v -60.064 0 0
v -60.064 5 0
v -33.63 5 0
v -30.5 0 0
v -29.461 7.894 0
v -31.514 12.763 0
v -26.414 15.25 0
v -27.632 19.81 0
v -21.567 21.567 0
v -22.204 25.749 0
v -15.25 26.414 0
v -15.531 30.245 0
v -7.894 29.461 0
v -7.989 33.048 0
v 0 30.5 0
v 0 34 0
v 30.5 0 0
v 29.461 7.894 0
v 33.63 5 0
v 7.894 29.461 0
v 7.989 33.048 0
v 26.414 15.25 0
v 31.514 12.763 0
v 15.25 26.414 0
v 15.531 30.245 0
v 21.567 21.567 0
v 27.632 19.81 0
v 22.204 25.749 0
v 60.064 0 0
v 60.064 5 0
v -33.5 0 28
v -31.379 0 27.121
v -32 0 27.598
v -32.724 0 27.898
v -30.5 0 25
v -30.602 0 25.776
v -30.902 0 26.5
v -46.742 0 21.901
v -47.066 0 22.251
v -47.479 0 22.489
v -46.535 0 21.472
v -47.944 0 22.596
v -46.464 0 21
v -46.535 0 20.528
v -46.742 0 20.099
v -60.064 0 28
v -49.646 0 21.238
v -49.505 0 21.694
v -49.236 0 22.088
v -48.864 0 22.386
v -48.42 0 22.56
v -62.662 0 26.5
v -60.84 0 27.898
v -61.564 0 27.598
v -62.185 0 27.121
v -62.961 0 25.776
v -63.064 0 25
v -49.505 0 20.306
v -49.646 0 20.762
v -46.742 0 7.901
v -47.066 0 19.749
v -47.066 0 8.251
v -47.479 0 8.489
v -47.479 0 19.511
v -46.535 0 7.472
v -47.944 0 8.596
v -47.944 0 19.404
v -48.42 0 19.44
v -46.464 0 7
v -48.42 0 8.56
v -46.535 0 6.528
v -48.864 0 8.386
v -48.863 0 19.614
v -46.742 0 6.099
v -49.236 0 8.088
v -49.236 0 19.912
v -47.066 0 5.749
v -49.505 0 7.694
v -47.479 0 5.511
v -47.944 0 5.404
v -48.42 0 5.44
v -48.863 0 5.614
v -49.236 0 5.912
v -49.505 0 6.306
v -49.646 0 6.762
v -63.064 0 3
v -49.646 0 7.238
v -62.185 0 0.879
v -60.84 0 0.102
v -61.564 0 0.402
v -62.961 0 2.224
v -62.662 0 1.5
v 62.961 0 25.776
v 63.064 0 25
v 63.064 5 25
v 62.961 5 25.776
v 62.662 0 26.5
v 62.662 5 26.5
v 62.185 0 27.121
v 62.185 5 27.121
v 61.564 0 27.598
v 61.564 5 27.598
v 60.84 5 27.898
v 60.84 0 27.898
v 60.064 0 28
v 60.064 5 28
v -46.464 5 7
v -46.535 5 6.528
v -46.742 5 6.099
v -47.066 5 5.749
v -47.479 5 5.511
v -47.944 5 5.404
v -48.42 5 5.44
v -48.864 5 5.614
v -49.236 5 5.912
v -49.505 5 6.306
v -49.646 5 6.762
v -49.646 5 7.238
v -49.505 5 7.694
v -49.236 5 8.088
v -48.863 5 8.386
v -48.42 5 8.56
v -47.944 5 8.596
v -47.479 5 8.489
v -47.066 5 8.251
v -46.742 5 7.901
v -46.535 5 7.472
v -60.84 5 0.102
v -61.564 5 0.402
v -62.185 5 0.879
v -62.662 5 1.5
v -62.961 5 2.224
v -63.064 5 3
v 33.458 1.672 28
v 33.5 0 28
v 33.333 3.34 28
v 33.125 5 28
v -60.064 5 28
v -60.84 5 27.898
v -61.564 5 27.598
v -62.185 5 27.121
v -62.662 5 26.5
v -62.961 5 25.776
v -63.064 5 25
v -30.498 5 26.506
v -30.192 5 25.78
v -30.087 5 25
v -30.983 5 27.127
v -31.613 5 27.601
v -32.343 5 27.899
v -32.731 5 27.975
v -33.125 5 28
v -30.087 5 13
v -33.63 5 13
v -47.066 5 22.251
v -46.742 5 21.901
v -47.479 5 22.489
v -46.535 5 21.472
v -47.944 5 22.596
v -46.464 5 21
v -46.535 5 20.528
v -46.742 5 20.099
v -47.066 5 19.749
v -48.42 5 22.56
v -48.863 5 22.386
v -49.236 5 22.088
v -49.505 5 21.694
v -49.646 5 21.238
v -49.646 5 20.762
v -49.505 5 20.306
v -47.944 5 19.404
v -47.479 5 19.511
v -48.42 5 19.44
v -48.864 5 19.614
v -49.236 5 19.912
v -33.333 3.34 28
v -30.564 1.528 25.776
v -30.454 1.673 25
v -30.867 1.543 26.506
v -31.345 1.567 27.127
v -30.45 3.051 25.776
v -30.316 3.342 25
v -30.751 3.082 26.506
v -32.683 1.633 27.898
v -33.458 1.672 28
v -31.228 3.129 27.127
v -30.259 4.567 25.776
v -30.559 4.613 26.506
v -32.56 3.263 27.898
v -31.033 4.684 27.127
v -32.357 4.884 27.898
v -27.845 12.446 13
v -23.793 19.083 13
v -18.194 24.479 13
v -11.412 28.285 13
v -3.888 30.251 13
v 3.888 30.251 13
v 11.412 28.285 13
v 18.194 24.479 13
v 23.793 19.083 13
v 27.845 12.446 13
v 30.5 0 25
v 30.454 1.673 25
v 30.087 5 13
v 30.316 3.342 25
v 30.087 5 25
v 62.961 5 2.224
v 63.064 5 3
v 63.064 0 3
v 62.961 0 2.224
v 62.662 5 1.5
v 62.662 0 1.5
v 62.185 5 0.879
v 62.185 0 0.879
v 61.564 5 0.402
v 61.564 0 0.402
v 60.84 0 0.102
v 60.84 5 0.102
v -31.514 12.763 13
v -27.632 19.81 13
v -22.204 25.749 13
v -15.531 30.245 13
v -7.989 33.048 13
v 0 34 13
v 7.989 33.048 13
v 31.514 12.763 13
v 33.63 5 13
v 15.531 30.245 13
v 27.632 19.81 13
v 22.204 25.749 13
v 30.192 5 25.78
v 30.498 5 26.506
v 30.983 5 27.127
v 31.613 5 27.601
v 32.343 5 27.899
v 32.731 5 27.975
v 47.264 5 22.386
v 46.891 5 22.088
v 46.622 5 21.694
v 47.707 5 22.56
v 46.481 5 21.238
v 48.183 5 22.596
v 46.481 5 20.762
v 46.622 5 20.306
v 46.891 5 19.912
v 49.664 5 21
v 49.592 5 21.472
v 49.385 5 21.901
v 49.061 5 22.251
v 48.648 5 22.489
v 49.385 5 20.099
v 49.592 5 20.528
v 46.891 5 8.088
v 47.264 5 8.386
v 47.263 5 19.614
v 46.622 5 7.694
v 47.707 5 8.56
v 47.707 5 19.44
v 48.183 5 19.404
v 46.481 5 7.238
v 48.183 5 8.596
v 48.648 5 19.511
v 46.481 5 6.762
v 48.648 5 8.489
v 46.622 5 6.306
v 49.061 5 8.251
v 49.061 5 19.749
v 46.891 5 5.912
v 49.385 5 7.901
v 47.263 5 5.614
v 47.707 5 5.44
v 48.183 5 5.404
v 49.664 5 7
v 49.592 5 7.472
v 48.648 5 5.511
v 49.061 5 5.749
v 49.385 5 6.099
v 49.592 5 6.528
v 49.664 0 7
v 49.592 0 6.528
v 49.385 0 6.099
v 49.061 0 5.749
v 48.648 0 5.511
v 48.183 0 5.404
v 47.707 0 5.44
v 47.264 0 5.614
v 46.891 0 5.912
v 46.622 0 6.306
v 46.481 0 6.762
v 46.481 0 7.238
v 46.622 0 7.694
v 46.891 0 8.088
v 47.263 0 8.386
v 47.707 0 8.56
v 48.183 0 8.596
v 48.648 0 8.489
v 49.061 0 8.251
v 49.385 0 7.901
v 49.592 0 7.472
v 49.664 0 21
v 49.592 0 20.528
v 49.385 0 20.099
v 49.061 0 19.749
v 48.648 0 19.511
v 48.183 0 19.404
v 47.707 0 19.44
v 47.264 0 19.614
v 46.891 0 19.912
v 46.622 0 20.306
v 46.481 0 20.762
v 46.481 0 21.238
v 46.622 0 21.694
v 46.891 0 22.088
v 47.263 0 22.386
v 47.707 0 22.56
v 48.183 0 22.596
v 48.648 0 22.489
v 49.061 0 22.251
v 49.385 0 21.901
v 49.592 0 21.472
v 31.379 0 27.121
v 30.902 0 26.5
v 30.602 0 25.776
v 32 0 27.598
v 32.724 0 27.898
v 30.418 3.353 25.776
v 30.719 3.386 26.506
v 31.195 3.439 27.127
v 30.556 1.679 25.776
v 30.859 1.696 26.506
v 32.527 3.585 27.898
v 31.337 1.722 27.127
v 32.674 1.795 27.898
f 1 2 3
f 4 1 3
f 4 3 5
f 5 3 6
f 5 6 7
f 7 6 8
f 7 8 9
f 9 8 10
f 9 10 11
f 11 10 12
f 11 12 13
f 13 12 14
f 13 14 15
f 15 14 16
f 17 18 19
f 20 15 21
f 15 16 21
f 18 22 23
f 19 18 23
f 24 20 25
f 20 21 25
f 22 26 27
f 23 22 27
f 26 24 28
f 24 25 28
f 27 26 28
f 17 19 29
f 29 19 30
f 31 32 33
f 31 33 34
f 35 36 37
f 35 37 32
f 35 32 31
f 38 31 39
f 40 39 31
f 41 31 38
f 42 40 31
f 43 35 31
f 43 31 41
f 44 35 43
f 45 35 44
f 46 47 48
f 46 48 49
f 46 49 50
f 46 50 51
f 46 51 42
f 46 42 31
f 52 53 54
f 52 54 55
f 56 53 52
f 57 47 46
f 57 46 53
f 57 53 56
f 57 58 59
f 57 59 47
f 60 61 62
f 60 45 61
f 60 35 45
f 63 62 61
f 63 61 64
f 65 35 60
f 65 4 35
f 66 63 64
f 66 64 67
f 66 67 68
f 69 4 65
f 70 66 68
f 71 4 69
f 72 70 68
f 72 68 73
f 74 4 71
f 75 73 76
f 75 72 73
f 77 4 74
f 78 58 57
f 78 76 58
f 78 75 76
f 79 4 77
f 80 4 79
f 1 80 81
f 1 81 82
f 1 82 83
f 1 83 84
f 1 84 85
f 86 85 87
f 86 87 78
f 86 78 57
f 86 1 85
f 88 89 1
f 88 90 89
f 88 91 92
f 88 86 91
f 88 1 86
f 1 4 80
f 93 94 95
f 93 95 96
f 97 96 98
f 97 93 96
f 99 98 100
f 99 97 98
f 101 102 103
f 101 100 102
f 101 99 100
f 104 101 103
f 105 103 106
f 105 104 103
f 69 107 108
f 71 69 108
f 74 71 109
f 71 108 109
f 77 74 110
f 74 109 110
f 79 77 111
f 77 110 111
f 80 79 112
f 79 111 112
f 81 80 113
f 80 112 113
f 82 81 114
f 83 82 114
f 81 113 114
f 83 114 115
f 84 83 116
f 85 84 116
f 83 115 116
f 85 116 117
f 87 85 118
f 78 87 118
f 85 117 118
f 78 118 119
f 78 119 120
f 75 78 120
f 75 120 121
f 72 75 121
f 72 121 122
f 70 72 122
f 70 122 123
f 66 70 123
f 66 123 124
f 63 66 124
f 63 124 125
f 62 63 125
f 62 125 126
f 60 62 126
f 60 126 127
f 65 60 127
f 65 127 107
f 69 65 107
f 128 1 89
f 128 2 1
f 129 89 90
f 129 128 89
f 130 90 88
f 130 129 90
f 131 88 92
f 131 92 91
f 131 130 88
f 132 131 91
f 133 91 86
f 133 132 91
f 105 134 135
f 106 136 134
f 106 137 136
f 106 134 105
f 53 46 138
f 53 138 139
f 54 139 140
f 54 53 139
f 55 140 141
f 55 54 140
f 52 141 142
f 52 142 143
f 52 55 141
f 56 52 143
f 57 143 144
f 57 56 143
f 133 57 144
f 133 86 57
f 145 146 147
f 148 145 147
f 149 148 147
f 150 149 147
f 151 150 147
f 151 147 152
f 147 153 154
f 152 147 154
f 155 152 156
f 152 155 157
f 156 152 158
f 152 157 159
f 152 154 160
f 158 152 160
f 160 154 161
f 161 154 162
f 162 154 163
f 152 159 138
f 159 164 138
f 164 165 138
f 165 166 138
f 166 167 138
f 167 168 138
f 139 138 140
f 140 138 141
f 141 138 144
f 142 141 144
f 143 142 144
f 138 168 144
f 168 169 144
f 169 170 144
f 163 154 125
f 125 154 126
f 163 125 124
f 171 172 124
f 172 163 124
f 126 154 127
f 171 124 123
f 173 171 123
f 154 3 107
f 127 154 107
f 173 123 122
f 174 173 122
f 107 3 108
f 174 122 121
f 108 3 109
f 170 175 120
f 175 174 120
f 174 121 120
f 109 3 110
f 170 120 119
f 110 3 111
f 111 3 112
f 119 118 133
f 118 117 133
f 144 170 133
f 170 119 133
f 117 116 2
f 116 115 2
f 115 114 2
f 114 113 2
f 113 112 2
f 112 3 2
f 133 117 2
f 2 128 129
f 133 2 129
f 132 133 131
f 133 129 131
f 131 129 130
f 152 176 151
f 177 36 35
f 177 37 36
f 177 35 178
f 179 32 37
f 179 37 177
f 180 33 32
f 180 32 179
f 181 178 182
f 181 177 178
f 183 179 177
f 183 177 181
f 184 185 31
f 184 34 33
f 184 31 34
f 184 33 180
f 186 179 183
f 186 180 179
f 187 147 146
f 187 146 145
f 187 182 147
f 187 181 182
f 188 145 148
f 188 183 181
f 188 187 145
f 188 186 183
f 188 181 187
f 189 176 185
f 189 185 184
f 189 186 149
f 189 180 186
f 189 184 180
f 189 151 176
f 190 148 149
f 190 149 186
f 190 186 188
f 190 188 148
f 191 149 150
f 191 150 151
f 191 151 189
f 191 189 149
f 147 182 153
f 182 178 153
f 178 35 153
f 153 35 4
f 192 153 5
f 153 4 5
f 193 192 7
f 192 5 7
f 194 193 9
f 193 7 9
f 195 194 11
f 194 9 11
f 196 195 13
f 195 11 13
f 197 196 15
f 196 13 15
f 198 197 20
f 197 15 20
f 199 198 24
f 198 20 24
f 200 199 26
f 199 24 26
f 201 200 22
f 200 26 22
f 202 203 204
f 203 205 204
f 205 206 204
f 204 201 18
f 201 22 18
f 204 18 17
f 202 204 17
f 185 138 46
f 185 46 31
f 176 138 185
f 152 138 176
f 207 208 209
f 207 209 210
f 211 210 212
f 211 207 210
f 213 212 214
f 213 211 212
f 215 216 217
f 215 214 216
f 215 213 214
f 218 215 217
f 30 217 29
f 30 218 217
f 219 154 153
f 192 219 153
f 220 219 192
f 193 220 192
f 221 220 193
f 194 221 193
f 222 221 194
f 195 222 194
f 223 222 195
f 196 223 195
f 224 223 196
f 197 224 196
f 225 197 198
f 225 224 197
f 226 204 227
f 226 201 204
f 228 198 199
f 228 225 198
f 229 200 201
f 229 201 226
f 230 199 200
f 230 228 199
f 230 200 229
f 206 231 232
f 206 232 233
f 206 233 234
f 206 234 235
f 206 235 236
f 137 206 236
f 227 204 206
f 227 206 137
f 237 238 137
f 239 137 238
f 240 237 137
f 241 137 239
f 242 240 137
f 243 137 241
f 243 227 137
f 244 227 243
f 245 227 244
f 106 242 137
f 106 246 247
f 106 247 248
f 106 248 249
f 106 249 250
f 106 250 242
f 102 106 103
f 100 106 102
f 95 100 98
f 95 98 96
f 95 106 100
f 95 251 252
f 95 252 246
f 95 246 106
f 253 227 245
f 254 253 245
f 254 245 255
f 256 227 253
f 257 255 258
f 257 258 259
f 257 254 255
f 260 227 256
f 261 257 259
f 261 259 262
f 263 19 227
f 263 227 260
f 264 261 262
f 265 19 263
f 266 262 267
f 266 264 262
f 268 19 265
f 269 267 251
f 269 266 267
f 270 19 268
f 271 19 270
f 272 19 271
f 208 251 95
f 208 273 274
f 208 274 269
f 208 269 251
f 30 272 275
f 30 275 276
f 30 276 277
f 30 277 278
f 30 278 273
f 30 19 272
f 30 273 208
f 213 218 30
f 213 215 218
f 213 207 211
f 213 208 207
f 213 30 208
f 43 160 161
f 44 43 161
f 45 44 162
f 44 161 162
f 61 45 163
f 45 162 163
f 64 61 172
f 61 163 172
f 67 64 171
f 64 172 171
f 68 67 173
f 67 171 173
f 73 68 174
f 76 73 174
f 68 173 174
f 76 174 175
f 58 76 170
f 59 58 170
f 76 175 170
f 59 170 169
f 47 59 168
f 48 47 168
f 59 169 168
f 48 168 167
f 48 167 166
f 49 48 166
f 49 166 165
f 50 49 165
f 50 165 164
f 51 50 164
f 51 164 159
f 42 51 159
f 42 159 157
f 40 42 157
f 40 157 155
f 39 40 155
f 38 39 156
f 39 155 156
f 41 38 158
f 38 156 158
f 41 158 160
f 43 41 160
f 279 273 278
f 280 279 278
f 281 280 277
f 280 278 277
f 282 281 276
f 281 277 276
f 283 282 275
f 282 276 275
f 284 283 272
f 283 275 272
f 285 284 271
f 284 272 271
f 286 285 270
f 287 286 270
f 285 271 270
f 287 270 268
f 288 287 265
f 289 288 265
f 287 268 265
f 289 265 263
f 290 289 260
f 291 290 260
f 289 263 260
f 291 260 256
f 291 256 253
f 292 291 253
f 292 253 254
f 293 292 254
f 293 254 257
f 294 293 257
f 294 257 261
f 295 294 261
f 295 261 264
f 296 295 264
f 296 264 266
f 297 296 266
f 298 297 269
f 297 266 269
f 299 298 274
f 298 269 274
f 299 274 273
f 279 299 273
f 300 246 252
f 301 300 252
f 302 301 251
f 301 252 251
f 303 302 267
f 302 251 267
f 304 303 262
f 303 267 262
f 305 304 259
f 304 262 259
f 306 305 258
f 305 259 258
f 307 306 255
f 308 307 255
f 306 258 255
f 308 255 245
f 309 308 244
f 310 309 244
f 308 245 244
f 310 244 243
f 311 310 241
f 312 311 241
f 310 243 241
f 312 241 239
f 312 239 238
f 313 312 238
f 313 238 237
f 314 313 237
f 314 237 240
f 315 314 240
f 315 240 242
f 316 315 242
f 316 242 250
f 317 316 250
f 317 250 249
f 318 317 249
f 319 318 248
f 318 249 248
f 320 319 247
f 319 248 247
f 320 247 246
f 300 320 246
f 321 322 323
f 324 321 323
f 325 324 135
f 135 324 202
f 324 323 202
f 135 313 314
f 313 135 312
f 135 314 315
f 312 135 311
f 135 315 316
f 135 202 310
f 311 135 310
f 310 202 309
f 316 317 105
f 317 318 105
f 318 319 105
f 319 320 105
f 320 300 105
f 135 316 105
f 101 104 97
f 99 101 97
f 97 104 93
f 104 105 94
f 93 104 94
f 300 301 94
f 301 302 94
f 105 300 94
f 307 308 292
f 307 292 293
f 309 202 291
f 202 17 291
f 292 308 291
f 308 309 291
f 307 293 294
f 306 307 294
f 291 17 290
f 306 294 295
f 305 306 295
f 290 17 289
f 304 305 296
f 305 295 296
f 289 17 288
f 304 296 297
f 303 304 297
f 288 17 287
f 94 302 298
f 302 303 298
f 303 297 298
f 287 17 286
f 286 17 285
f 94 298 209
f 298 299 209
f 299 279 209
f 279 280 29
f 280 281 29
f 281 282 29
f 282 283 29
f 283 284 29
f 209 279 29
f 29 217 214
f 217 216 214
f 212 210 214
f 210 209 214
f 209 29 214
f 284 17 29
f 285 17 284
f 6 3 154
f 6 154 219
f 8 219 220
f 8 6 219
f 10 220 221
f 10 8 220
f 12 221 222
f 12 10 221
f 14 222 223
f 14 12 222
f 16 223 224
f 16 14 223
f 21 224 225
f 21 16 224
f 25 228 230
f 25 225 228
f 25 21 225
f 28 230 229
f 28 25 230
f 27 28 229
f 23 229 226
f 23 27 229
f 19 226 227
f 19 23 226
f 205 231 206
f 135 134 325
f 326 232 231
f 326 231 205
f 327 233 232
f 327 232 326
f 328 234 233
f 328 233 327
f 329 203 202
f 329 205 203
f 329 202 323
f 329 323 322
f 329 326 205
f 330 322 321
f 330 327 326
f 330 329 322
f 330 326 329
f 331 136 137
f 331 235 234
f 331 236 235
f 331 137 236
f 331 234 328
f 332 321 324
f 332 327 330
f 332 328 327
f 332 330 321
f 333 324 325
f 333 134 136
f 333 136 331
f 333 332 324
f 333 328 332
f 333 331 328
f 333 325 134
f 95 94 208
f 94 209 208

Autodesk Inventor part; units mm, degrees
ref_plane "YZ Plane" through (0, 0, 0) normal (1, 0, 0) x (0, 1, 0)
ref_plane "XZ Plane" through (0, 0, 0) normal (0, 1, 0) x (-1, 0, 0)
ref_plane "XY Plane" through (0, 0, 0) normal (0, 0, 1) x (1, 0, 0)
sketch "Эскиз1" plane through (0, 0, 0) normal (0, 0, 1) x (1, 0, 0)
  circle A0 centre (0, 0) radius 30.5
  circle A1 centre (0, 0) radius 34
  line L0 (0, 0) -> (-48.0635, 0)
  line L1 (-48.0635, 0) -> (48.0635, 0)
  line L2 (-48.0635, 0) -> (-63.0635, 0)
  line L3 (48.0635, 0) -> (63.0635, 0)
  line L4 (-63.0635, 0) -> (-63.0635, 5)
  line L5 (-63.0635, 5) -> (48.0635, 5)
  line L6 (48.0635, 5) -> (48.0635, 0)
  line L7 (63.0635, 0) -> (63.0635, 5)
  line L8 (63.0635, 5) -> (48.0635, 5)
  point P0 (-30.5, 0)
  point P1 (30.5, 0)
  point P2 (34, 0)
  point P3 (-34, 0)
  point P4 (33.6303, 5)
  point P5 (-33.6303, 5)
  dimension "d0" = 61
  dimension "d1" = 68
  dimension "d2" = 48.0635
  dimension "d3" = 96.127
  dimension "d4" = 15
  dimension "d5" = 15
  dimension "d9" = 5
extrude "Выдавливание1" add sketch "Эскиз1" along normal blind 13 contours A0 L5 A1 L1 | A0 L5 A1 | L0 A1 L5 A0 | A1 L5 L6 L1 | L0 L2 L4 L5 A1 | L6 L8 L7 L3
sketch "Эскиз2" plane through (0, 0, 13) normal (0, 0, 1) x (1, 0, 0)
  circle A0 centre (0, 0) radius 30.5
  line L0 (-63.0635, 0) -> (-30.5, 0) projected
  line L1 (-63.0635, 0) -> (-30.0874, 0)
  line L2 (-30.0874, 0) -> (-30.0874, 5)
  line L3 (-30.0874, 5) -> (-63.0635, 5)
  line L4 (-63.0635, 5) -> (-63.0635, 0)
  line L5 (30.5, 0) -> (63.0635, 0) projected
  arc A1 (30.5, 0) -> (-30.5, 0) centre (0, 0) ccw projected
  line L6 (63.0635, 0) -> (30.0874, 0)
  line L7 (30.0874, 0) -> (30.0874, 5)
  line L8 (30.0874, 5) -> (63.0635, 5)
  line L9 (63.0635, 5) -> (63.0635, 0)
extrude "Выдавливание2" add sketch "Эскиз2" along normal blind 15 contours A0 L8 L9 L5 | L0 L4 L3 A0
sketch "Эскиз3" plane through (-63.0635, 5, 0) normal (0, 1, 0) x (1, 0, 0)
  line L0 (0, 0) -> (32.5635, 0) projected
  line L1 (0, 0) -> (15, 0)
  line L2 (15, 0) -> (15, -7)
  line L3 (15, -7) -> (15, -21)
  line L4 (93.5635, 0) -> (126.127, 0) projected
  line L5 (126.127, 0) -> (111.127, 0)
  line L6 (111.127, 0) -> (111.127, -7)
  line L7 (111.127, -7) -> (111.127, -21)
  circle A0 centre (111.127, -21) radius 1.6
  circle A1 centre (111.127, -7) radius 1.6
  circle A2 centre (15, -21) radius 1.6
  circle A3 centre (15, -7) radius 1.6
  point P0 (63.0635, 0)
  dimension "d12" = 15
  dimension "d13" = 7
  dimension "d14" = 14
  dimension "d15" = 15
  dimension "d16" = 3.2
  dimension "d17" = 3.2
  dimension "d18" = 3.2
  dimension "d19" = 3.2
extrude "Выдавливание3" cut sketch "Эскиз3" against normal blind 15
fillet "Сопряжение1" radius 3 6 edges at (30.3967, 2.5085, 28) (63.0635, 2.5, 28) (63.0635, 2.5, 0) (-63.0635, 2.5, 0) (-63.0635, 2.5, 28) (-30.3967, 2.5085, 28)
properties part number "vydacha_2"
